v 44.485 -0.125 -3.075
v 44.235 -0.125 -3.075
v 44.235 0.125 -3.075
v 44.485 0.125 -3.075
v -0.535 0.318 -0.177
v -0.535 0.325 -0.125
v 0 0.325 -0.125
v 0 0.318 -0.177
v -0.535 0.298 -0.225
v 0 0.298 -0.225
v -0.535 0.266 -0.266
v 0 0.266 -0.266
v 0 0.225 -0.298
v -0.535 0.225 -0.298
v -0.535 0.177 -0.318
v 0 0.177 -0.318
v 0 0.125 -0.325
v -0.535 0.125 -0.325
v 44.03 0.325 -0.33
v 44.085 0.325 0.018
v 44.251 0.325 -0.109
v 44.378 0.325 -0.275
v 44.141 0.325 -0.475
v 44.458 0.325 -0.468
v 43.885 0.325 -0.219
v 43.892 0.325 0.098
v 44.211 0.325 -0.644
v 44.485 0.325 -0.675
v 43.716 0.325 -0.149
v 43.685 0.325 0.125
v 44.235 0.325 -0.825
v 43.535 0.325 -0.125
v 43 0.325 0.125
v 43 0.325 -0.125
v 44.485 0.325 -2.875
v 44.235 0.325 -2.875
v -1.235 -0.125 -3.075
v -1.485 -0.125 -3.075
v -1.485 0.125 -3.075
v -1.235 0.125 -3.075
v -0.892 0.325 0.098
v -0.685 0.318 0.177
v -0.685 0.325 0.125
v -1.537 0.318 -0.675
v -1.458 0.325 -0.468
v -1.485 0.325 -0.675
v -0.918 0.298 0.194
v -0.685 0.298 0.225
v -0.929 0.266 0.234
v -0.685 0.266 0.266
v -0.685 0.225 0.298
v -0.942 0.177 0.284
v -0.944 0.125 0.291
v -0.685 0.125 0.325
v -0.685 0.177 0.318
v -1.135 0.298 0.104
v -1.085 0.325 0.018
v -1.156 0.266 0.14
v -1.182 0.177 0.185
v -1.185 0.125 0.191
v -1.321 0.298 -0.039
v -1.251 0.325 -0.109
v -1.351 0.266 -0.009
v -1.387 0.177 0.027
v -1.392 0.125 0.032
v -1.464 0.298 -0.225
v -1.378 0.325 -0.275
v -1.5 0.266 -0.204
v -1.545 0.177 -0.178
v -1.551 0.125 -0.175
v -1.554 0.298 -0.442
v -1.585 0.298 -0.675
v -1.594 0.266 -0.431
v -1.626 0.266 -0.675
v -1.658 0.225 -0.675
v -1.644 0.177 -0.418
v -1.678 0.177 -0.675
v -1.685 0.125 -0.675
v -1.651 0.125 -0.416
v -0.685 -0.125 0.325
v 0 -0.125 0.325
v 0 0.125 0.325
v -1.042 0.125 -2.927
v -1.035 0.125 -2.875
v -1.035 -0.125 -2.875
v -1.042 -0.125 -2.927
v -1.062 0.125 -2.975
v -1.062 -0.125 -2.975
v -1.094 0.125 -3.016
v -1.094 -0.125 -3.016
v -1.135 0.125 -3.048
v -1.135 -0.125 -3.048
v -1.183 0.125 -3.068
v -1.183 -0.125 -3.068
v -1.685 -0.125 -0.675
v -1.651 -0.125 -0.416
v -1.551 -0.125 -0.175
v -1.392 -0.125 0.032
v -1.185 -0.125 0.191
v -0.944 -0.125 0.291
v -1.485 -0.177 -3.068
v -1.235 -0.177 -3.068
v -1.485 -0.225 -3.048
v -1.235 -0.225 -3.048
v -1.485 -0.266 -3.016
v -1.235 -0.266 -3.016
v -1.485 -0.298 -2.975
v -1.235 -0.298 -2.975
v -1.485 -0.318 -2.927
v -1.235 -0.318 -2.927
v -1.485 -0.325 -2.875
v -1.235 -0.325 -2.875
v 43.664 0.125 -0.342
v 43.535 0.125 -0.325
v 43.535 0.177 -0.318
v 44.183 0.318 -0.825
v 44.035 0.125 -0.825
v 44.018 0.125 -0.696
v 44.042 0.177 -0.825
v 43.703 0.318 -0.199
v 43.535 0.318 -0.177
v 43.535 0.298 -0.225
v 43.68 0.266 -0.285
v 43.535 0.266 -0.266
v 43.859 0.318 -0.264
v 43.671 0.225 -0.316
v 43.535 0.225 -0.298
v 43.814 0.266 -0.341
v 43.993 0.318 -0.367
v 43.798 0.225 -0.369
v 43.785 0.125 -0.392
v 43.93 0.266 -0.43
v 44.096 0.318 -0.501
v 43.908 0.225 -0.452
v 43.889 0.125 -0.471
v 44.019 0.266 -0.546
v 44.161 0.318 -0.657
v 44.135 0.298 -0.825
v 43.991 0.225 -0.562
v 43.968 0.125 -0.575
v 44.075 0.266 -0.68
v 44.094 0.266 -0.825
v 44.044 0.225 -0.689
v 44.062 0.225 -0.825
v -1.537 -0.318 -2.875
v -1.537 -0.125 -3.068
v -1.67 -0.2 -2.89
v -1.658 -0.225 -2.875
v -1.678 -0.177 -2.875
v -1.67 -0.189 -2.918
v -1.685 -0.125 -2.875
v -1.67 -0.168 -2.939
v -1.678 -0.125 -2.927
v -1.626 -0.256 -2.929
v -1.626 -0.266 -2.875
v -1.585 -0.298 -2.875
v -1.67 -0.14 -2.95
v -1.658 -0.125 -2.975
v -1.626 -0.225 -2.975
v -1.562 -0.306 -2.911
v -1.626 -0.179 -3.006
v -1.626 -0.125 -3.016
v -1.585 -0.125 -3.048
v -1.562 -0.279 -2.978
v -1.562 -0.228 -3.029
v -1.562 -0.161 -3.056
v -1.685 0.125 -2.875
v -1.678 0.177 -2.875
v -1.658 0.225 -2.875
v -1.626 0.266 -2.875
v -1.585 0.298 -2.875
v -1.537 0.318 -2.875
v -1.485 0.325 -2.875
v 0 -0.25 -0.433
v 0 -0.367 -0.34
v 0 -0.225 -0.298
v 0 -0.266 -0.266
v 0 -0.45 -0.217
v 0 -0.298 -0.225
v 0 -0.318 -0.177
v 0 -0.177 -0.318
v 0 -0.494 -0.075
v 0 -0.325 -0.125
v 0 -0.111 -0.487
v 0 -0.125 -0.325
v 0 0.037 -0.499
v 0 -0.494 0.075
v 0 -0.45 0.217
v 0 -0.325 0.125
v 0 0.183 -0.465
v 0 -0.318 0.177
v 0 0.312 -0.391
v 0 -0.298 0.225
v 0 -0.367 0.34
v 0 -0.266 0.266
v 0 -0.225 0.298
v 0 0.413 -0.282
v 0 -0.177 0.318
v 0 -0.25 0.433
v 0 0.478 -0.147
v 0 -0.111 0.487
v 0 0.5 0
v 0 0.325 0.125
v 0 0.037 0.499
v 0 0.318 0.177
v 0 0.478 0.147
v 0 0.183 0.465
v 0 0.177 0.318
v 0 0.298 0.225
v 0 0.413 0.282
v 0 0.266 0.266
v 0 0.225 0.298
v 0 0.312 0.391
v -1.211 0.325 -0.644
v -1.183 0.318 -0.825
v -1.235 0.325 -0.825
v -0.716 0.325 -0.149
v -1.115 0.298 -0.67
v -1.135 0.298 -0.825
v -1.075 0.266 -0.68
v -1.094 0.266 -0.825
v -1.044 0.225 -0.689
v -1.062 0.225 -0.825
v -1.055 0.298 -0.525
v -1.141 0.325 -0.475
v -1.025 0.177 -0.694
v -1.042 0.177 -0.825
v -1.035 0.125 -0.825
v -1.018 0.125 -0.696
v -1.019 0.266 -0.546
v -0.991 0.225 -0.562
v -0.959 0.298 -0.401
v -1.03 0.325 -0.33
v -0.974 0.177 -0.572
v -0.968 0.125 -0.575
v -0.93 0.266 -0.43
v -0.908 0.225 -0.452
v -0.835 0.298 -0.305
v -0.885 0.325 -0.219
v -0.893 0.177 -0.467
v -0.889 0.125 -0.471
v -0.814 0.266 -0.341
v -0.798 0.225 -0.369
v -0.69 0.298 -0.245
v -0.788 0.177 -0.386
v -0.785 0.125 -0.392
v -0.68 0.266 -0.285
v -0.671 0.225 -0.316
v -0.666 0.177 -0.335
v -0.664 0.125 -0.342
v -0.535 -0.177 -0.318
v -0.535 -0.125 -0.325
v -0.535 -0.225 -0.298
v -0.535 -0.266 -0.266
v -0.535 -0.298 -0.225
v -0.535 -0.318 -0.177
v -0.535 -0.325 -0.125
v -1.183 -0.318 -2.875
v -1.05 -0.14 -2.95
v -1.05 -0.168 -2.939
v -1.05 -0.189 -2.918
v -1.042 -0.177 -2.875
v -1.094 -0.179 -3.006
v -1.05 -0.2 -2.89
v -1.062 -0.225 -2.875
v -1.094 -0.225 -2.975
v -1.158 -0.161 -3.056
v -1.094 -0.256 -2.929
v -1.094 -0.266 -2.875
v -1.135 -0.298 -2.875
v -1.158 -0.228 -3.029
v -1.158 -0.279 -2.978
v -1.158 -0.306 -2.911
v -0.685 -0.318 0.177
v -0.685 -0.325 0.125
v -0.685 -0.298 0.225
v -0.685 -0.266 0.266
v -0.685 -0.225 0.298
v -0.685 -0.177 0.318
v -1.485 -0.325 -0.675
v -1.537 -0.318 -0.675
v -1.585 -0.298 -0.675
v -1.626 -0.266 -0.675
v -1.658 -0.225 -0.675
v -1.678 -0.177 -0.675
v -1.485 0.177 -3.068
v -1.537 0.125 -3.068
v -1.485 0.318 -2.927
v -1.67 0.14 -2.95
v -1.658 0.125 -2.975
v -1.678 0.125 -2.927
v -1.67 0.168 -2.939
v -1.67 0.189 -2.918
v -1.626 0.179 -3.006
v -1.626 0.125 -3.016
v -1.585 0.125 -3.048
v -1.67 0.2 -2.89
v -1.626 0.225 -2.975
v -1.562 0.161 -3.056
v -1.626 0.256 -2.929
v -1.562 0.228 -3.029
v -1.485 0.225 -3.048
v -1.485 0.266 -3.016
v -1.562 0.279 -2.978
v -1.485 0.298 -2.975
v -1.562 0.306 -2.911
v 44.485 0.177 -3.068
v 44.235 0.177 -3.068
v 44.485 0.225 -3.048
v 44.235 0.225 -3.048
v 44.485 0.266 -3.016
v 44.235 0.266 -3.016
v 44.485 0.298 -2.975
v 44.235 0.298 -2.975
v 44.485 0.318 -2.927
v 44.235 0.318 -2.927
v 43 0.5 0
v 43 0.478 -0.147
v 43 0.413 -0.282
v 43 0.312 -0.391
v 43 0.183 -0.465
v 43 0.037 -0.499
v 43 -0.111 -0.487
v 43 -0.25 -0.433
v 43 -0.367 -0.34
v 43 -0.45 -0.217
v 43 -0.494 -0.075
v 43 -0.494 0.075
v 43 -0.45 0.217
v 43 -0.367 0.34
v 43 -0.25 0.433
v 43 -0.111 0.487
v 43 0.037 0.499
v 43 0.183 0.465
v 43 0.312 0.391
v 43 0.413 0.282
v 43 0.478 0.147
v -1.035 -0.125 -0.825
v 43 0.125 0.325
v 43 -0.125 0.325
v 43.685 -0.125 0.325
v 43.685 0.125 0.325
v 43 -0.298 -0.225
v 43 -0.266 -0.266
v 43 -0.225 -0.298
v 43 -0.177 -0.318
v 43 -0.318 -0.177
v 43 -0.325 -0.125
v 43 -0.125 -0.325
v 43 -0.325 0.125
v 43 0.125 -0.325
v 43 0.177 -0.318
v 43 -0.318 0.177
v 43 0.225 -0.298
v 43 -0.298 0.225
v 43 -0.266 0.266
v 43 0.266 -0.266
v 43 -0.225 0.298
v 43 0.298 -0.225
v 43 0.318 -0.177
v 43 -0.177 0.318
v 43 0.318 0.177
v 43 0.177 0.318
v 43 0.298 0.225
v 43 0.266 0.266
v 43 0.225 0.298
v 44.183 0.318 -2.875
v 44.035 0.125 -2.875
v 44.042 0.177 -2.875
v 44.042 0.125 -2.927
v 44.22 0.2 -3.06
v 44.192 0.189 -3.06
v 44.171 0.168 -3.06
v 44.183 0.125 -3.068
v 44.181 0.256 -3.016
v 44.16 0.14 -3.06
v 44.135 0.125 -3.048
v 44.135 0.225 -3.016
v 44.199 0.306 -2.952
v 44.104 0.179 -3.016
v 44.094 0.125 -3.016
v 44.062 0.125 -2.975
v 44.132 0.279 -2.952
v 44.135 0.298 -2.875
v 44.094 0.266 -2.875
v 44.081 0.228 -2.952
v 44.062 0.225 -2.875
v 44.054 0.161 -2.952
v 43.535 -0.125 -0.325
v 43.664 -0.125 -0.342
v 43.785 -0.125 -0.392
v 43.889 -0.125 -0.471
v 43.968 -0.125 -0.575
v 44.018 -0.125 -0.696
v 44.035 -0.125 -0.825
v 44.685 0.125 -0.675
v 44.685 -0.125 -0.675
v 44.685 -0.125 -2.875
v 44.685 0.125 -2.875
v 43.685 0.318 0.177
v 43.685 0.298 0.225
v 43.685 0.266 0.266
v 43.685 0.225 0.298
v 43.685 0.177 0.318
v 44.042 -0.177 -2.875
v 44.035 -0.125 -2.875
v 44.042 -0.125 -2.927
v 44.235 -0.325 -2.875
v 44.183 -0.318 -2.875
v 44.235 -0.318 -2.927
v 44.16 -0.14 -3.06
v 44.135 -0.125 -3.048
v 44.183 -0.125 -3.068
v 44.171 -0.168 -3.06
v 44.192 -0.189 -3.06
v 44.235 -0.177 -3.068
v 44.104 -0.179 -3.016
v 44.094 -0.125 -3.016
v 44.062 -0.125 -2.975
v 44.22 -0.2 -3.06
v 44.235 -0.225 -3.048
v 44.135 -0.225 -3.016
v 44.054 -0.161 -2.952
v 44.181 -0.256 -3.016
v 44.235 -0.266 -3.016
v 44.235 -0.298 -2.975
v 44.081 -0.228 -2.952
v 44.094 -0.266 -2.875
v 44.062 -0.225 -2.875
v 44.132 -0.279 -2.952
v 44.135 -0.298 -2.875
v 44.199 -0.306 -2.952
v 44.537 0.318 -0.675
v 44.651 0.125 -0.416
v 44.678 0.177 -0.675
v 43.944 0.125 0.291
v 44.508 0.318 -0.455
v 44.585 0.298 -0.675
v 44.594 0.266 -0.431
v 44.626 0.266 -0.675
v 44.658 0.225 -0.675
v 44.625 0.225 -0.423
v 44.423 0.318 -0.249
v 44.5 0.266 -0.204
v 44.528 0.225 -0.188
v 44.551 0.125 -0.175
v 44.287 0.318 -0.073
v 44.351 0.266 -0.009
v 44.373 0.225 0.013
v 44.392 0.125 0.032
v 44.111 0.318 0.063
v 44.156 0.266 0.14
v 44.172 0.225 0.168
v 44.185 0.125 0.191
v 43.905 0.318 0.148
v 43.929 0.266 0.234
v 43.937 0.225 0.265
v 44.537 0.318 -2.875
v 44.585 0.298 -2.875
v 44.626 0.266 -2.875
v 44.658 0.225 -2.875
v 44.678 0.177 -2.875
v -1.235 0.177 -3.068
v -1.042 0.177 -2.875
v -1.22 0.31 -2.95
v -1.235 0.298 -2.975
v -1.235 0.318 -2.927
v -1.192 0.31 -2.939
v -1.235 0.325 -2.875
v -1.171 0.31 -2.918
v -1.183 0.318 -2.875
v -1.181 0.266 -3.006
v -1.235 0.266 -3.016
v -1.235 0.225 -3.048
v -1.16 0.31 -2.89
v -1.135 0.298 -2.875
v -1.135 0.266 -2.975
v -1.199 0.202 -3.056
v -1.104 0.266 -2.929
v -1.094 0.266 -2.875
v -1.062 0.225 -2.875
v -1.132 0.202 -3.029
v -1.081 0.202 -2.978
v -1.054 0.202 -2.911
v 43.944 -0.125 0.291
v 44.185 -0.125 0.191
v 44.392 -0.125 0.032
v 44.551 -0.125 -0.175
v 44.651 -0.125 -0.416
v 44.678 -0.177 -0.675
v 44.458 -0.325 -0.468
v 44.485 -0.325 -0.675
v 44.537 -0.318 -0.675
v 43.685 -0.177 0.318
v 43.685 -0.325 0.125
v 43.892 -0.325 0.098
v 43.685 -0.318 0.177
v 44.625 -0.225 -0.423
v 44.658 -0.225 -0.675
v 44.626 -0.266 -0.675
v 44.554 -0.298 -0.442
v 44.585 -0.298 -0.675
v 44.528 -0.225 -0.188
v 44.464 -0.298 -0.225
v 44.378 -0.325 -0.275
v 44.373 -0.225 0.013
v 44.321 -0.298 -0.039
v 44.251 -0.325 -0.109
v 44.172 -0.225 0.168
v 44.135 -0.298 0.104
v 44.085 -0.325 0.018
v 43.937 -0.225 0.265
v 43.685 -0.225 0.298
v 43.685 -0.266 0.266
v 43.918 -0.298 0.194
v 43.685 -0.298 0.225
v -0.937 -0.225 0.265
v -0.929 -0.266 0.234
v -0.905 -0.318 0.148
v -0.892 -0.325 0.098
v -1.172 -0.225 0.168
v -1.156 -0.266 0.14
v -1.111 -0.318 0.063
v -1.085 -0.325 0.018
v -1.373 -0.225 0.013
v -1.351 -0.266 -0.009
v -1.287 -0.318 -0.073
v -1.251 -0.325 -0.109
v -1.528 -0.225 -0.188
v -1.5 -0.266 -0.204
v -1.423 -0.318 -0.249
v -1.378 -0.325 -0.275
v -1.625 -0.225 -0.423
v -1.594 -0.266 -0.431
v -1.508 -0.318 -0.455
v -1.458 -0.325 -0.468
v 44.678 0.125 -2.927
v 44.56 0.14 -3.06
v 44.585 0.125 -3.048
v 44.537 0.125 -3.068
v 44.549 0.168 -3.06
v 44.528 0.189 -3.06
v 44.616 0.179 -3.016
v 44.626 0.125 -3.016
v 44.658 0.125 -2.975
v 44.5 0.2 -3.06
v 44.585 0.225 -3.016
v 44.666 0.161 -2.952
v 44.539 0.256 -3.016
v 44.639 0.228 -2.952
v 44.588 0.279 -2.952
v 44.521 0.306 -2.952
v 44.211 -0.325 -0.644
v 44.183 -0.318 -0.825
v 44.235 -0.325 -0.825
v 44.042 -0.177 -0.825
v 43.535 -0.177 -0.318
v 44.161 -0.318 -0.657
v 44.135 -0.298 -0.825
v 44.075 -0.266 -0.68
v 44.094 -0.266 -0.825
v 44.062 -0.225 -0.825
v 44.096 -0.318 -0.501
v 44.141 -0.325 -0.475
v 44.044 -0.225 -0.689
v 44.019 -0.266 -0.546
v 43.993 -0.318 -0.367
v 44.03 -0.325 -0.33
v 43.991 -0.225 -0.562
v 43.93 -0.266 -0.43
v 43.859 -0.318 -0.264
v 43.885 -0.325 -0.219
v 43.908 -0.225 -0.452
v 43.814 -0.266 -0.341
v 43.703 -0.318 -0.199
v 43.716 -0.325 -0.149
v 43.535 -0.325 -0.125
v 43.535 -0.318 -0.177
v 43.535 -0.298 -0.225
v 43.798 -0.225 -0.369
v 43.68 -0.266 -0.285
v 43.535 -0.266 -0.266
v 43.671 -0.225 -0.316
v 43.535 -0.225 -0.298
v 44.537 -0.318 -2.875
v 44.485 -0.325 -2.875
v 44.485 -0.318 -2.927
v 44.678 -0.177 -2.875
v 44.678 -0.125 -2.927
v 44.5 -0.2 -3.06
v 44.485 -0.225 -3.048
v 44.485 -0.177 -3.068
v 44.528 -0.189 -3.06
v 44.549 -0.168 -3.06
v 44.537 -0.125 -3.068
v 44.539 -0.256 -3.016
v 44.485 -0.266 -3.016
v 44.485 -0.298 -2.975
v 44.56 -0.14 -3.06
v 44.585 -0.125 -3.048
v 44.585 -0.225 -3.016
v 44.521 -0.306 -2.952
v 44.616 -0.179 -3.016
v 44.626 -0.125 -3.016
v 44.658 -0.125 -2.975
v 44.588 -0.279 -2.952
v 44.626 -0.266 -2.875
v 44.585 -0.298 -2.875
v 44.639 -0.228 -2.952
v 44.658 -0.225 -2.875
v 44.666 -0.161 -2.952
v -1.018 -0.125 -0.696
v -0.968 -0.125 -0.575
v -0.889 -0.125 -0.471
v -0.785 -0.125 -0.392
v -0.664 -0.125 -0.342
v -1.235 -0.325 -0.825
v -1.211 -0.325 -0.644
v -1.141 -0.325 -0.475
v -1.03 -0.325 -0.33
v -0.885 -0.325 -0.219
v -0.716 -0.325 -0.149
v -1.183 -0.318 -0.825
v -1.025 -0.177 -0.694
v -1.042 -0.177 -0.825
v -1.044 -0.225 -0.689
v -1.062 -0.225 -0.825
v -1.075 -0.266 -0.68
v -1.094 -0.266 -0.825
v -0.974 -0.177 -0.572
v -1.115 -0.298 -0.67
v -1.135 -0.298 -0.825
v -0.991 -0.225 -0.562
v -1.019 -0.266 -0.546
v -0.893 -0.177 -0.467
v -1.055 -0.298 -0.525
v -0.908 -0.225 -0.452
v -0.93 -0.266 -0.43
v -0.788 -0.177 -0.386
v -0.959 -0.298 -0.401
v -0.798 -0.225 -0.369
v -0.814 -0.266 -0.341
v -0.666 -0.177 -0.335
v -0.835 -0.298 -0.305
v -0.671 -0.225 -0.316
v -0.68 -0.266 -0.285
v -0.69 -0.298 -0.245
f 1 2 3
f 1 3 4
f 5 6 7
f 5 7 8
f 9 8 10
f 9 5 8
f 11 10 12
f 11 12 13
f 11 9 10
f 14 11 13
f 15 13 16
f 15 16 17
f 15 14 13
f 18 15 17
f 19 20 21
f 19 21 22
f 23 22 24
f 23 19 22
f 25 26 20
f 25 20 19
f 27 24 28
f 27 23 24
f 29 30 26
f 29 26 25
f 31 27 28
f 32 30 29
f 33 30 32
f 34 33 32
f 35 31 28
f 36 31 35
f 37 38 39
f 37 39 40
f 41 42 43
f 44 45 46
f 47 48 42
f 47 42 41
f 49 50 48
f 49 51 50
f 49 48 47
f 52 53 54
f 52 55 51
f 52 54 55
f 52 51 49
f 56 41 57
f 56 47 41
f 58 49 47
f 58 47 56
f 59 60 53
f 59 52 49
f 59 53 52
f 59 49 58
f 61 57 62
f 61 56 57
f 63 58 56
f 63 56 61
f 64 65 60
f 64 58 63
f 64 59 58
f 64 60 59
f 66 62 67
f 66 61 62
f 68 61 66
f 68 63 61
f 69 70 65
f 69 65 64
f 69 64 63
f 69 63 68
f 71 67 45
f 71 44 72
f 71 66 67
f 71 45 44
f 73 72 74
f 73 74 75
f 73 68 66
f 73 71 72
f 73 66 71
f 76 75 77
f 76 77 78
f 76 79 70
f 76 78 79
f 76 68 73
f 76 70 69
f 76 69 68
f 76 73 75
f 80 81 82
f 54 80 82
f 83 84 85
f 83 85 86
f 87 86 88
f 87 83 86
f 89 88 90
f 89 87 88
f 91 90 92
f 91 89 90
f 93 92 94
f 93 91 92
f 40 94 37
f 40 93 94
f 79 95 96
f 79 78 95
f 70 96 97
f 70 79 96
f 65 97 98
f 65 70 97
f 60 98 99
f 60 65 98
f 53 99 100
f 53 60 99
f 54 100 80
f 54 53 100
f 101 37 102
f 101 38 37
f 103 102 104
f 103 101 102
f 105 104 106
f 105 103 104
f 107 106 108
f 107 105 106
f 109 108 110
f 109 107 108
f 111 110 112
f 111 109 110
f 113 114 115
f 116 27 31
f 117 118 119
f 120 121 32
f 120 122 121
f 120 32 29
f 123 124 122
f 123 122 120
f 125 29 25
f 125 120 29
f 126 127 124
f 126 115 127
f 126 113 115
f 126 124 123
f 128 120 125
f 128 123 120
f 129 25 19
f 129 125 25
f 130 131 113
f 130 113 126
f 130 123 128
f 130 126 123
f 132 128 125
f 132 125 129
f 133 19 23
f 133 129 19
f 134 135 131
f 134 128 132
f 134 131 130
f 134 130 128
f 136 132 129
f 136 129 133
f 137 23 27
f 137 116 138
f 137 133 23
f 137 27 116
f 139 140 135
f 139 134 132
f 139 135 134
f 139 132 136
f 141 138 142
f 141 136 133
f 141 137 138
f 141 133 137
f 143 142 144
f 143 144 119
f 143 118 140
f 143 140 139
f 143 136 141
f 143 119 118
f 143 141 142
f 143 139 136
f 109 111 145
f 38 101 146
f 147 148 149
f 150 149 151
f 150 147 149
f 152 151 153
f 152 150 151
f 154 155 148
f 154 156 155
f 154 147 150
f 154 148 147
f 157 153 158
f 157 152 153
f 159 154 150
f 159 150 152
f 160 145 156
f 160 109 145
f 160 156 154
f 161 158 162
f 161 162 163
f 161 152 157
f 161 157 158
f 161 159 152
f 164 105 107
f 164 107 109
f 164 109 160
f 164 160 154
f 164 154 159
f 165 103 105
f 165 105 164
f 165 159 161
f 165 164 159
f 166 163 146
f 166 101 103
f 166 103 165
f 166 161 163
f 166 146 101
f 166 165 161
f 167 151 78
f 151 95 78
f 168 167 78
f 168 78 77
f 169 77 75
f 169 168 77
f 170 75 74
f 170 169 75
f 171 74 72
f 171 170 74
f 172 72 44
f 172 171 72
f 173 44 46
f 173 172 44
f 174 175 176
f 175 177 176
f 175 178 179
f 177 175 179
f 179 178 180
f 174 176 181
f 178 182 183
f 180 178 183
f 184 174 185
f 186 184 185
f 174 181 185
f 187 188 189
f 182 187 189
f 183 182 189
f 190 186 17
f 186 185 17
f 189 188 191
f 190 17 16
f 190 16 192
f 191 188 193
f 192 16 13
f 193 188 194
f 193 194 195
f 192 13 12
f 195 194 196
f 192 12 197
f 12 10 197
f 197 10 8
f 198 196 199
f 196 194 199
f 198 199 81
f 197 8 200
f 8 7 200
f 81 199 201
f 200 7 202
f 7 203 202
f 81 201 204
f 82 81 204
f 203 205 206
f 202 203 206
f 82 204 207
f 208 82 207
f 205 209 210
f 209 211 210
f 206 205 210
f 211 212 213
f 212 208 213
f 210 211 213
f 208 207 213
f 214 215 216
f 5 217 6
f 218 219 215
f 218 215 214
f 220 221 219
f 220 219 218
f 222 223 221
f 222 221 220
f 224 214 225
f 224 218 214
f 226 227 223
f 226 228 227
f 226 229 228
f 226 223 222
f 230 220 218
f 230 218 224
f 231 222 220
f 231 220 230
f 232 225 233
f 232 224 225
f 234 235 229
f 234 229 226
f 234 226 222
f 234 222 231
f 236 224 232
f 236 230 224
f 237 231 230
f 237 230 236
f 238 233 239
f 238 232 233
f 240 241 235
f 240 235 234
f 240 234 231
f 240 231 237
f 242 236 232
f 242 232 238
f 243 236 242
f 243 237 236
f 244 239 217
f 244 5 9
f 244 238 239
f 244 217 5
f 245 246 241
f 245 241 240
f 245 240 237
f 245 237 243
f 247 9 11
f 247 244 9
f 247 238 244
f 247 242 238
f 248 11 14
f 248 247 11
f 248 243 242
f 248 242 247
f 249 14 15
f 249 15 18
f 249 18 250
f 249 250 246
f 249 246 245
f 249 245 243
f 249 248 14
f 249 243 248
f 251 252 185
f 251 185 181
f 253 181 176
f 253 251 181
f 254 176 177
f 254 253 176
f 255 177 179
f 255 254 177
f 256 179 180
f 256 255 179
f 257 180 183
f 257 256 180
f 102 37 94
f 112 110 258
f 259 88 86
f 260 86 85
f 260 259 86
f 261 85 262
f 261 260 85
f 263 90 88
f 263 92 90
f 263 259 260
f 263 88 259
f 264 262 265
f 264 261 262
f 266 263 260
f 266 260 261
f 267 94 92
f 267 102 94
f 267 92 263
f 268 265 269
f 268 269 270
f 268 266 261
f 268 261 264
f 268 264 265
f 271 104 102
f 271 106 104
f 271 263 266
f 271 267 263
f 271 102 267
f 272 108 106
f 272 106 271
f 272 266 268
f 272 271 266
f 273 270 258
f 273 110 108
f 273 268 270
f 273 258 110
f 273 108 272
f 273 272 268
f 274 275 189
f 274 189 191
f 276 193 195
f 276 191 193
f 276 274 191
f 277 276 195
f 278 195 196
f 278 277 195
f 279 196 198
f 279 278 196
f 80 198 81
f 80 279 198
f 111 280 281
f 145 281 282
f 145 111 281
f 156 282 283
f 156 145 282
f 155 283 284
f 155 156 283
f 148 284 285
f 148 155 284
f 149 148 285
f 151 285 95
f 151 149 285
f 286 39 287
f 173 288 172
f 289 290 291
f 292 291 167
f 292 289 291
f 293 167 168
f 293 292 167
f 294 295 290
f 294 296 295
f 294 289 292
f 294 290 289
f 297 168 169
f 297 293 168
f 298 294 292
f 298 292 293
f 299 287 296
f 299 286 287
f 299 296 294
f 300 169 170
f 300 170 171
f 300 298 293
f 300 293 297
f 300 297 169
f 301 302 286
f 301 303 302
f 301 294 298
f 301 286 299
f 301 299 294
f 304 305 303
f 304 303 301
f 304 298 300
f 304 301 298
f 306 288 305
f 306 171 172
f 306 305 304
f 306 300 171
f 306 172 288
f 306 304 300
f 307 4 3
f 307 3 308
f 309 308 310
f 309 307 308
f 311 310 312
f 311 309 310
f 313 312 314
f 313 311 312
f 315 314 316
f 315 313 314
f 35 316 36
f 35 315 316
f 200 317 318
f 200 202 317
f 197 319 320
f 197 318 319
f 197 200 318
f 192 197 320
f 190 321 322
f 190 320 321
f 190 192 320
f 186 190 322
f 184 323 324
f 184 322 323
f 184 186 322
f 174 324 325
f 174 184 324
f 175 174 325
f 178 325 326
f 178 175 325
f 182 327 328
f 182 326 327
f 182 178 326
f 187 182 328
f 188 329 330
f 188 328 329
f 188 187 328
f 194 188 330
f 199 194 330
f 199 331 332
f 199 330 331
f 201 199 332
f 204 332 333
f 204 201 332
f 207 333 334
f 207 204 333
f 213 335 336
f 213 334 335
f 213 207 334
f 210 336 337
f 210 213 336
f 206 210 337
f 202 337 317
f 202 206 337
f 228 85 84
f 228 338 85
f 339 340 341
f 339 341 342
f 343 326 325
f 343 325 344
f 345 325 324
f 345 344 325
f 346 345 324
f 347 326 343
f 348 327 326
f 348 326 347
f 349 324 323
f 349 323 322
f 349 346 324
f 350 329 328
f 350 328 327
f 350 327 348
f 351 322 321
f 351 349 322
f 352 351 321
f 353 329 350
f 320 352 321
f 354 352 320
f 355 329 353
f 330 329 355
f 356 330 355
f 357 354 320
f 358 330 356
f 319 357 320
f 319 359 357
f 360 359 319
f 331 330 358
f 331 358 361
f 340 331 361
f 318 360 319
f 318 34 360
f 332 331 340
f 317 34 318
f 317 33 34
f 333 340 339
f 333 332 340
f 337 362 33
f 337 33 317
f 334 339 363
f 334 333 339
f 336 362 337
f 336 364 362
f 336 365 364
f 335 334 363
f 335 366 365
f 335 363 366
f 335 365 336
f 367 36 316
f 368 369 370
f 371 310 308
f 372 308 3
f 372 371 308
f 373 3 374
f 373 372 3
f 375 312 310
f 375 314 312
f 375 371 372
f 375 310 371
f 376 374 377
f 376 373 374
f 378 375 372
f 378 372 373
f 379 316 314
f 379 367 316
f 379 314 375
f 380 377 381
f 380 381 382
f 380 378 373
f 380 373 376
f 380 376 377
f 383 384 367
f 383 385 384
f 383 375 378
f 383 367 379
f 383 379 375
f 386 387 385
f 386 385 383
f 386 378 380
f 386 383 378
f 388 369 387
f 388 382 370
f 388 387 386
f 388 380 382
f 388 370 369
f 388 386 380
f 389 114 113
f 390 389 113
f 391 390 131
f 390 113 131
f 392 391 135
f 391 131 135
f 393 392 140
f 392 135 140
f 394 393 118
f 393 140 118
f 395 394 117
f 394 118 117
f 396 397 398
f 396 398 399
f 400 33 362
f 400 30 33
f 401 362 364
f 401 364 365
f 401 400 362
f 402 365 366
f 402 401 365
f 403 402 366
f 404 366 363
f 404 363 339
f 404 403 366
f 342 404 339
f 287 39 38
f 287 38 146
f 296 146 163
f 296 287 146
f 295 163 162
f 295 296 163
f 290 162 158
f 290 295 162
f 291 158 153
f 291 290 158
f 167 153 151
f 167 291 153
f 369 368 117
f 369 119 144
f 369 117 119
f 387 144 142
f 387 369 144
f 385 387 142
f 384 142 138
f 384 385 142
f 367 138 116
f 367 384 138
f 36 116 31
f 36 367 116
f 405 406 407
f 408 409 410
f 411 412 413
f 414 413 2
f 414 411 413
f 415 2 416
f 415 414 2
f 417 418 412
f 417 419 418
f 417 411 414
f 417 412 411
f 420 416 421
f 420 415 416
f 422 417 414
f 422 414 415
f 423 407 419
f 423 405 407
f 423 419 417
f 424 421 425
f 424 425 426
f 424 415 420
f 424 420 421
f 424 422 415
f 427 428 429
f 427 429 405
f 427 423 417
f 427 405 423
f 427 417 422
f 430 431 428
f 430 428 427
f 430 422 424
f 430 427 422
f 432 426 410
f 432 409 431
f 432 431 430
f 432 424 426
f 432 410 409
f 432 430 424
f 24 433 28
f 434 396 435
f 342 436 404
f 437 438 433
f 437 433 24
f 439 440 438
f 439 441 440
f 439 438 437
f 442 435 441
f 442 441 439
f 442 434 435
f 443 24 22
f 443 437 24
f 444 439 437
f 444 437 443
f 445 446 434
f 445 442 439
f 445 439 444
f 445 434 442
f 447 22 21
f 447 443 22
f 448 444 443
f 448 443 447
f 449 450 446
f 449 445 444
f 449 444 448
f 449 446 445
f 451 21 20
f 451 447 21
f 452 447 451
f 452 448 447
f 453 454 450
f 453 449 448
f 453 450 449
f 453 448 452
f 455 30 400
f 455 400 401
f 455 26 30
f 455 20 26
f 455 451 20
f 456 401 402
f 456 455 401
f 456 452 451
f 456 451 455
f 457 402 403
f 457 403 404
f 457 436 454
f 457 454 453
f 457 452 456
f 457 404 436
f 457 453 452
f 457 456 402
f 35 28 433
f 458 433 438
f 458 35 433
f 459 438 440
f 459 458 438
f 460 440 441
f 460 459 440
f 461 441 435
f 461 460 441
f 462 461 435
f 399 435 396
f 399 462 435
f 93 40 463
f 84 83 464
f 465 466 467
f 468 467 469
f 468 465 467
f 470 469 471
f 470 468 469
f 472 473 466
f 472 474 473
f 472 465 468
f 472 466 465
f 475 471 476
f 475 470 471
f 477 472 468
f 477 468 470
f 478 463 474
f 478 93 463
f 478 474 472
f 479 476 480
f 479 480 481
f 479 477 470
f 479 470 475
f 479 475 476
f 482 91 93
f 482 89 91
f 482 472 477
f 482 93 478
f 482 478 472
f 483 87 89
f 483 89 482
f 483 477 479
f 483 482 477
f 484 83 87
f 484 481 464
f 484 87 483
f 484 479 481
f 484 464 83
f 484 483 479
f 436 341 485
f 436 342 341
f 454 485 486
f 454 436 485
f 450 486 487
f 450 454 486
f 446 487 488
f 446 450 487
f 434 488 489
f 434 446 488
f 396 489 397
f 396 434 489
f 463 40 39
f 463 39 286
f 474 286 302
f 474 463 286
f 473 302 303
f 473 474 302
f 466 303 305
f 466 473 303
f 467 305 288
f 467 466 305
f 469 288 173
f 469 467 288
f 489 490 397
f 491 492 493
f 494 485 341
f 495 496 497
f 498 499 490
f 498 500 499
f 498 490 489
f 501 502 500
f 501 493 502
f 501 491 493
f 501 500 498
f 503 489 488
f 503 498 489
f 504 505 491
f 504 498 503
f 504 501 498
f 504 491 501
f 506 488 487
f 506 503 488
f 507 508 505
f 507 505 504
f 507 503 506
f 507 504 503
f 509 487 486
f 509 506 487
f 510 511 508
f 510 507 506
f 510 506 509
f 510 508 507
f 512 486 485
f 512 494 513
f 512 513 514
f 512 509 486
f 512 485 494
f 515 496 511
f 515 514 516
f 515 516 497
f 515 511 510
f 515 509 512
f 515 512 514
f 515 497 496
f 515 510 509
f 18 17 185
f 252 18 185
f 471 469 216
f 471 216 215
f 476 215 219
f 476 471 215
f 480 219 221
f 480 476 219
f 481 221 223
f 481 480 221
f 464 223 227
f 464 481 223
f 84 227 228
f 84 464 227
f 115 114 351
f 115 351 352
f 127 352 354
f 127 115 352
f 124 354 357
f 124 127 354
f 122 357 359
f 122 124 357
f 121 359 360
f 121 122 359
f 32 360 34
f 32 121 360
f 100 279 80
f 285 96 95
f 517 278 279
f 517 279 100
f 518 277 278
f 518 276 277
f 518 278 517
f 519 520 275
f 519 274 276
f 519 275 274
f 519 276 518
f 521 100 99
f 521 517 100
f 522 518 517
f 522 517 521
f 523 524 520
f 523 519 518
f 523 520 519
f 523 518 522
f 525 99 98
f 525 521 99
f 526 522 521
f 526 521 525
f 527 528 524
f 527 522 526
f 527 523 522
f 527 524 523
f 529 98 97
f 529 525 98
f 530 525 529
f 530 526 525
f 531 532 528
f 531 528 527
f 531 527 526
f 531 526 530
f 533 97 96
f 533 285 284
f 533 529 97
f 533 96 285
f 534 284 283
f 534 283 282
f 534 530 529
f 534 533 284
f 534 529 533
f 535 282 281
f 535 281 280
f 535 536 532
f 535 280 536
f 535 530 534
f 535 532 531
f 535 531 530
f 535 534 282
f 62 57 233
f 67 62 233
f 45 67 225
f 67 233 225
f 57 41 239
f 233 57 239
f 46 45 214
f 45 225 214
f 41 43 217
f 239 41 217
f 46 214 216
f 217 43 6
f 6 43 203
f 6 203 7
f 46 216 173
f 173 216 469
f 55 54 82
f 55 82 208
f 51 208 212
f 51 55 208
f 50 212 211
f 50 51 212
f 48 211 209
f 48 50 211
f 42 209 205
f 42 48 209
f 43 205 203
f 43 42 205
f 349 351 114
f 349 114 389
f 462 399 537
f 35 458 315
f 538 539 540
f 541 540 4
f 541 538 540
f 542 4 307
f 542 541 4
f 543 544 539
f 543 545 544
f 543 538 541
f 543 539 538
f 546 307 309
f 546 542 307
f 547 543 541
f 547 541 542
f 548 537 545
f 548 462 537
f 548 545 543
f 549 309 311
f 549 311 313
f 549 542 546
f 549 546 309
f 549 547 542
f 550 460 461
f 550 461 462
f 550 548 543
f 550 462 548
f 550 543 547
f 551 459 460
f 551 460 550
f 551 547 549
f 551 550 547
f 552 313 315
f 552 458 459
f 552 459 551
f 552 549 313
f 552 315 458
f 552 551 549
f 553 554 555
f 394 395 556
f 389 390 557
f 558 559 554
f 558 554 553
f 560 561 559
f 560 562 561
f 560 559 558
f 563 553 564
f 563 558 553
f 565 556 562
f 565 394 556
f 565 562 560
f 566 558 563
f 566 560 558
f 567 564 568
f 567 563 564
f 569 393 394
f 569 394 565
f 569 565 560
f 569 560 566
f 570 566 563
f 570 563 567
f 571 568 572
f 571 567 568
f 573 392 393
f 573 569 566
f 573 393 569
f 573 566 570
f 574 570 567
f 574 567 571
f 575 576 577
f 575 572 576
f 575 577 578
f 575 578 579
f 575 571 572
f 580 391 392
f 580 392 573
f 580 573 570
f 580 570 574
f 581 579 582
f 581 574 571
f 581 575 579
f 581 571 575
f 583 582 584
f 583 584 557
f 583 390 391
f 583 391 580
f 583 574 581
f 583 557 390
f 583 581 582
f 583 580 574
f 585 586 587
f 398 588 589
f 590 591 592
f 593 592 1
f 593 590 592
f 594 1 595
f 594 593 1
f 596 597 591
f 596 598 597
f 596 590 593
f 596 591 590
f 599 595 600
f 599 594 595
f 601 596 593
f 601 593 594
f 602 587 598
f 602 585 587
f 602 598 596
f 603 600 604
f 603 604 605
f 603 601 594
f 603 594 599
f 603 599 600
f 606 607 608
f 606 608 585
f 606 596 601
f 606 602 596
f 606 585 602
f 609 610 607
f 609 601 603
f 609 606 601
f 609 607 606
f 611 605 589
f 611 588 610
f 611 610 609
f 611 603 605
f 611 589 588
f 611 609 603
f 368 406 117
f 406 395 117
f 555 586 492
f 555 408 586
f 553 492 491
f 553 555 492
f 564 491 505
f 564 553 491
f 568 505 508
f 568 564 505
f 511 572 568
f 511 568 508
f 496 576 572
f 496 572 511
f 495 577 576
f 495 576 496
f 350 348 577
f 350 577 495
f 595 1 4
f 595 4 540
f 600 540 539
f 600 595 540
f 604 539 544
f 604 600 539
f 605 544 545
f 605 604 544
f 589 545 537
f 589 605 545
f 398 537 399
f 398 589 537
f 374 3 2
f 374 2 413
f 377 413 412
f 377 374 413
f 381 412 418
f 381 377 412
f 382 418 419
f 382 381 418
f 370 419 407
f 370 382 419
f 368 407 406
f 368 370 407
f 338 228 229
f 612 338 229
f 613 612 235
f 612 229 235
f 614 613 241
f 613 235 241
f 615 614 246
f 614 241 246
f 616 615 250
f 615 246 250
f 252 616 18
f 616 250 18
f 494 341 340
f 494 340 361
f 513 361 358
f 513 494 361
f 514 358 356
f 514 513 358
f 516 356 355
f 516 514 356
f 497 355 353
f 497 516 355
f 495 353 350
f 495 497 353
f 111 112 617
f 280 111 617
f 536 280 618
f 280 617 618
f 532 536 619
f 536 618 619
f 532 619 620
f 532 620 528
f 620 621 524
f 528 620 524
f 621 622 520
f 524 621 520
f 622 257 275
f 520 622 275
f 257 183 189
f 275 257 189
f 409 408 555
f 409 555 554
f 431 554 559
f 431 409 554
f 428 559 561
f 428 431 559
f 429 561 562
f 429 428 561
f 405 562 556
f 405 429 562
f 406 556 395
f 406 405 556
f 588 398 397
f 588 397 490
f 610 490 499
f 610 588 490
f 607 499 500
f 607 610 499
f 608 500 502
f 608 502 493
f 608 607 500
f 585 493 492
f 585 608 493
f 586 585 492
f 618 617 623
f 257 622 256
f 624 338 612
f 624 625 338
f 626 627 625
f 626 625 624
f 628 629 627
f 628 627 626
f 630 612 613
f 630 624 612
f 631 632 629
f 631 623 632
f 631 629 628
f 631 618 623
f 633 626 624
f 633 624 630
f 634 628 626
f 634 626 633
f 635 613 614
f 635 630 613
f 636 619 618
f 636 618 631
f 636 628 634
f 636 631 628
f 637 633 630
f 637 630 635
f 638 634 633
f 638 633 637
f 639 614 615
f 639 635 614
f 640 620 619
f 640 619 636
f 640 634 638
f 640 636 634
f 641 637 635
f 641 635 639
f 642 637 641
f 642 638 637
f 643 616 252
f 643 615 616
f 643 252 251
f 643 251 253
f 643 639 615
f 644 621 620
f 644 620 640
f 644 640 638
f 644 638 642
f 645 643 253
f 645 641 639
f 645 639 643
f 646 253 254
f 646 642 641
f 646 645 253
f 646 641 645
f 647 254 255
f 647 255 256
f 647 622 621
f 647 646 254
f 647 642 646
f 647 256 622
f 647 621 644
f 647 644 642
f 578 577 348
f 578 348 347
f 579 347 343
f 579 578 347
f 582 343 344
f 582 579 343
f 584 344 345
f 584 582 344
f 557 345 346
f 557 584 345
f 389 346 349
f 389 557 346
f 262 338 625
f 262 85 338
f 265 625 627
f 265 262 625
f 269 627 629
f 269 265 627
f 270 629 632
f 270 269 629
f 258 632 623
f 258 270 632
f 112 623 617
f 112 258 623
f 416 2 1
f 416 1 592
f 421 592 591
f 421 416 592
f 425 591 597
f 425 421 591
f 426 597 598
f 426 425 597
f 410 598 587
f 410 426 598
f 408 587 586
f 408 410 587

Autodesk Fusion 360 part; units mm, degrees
sketch "Sketch1" plane through (0, 0, 0) normal (1, 0, 0) x (0, 1, 0)
  circle A0 centre (0, 0) radius 0.5
  line L0 (0.325, -0.325) -> (-0.325, -0.325)
  line L1 (-0.325, -0.325) -> (-0.325, 0.325)
  line L2 (-0.325, 0.325) -> (0.325, 0.325)
  line L3 (0.325, 0.325) -> (0.325, -0.325)
  line L4 (0.325, -0.325) -> (-0.325, 0.325) construction
  line L5 (-0.325, -0.325) -> (0.325, 0.325) construction
  dimension "d1" = 1
  dimension "d2" = 0.65
  dimension "d3" = 0.65
extrude "Extrude1" add sketch "Sketch1" along normal blind 43 contours A0 | L0 L1 L2 L3
sketch "Sketch2" plane through (43, 0, 0) normal (1, 0, 0) x (0, 1, 0)
  circle A0 centre (0, 0) radius 0.5
  line L0 (0.325, -0.325) -> (-0.325, -0.325)
  line L1 (-0.325, -0.325) -> (-0.325, 0.325)
  line L2 (-0.325, 0.325) -> (0.325, 0.325)
  line L3 (0.325, 0.325) -> (0.325, -0.325)
  line L4 (0.325, -0.325) -> (-0.325, 0.325) construction
  line L5 (-0.325, -0.325) -> (0.325, 0.325) construction
  dimension "d8" = 0.65
  dimension "d9" = 0.65
extrude "Extrude2" add sketch "Sketch2" along normal blind 1.685 contours L0 L1 L2 L3
extrude "Extrude3" add sketch "Sketch1" against normal blind 1.685 contours L0 L1 L2 L3
sketch "Sketch3" plane through (0, 0, -0.325) normal (0, 0, -1) x (1, 0, 0)
  line L0 (43, 0.325) -> (43, -0.325)
  line L1 (43, -0.325) -> (44.685, -0.325)
  line L2 (44.685, -0.325) -> (44.685, 0.325)
  line L3 (44.685, 0.325) -> (43, 0.325)
  line L4 (44.685, 0.325) -> (44.035, 0.325)
  line L5 (44.035, 0.325) -> (44.035, -0.325)
  line L6 (44.035, -0.325) -> (44.685, -0.325)
  line L7 (44.685, -0.325) -> (44.685, 0.325)
  line L8 (44.685, 0.325) -> (44.035, -0.325) construction
  line L9 (44.035, 0.325) -> (44.685, -0.325) construction
  point P0 (44.36, 0)
  dimension "d14" = 0.65
  dimension "d15" = 0.65
sketch "Sketch4" plane through (0, 0, -0.325) normal (0, 0, -1) x (1, 0, 0)
  line L0 (0, -0.325) -> (0, 0.325)
  line L1 (0, 0.325) -> (-1.685, 0.325)
  line L2 (-1.685, 0.325) -> (-1.685, -0.325)
  line L3 (-1.685, -0.325) -> (0, -0.325)
  line L4 (-1.035, -0.325) -> (-1.685, -0.325)
  line L5 (-1.685, -0.325) -> (-1.685, 0.325)
  line L6 (-1.685, 0.325) -> (-1.035, 0.325)
  line L7 (-1.035, 0.325) -> (-1.035, -0.325)
  line L8 (-1.035, -0.325) -> (-1.685, 0.325) construction
  line L9 (-1.685, -0.325) -> (-1.035, 0.325) construction
  point P0 (-1.36, 0)
  dimension "d17" = 0.65
  dimension "d18" = 0.65
extrude "Extrude4" add sketch "Sketch4" sketch "Sketch3" along normal blind 2.75 contours L1 L2 L3 L4 L5 L6 L7 of sketch 2 contours L1 L2 L3 L4 L5 L6 L7
fillet "Fillet1" radius 0.5 2 edges at (-1.035, 0, -0.325) (44.035, 0, -0.325)
fillet "Fillet2" radius 1 2 edges at (-1.685, 0, 0.325) (44.685, 0, 0.325)
fillet "Fillet3" radius 0.2 32 edges at (-1.36, -0.325, -3.075) (-1.035, 0, -3.075) (-1.36, 0.325, -3.075) (-1.685, 0, -3.075) (-0.8886, -0.325, -0.4714) (-1.035, -0.325, -1.95) (-0.2675, -0.325, -0.325) (-0.3425, -0.325, 0.325) (-1.3921, -0.325, 0.0321) (-1.685, -0.325, -1.875) (-0.3425, 0.325, 0.325) (-1.3921, 0.325, 0.0321) (-1.685, 0.325, -1.875) (-0.8886, 0.325, -0.4714) (-0.2675, 0.325, -0.325) (-1.035, 0.325, -1.95) (43.3425, -0.325, 0.325) (44.3921, -0.325, 0.0321) (44.685, -0.325, -1.875) (44.035, -0.325, -1.95) (43.8886, -0.325, -0.4714) (43.2675, -0.325, -0.325) (44.685, 0.325, -1.875) (44.3921, 0.325, 0.0321) (43.3425, 0.325, 0.325) (43.8886, 0.325, -0.4714) (44.035, 0.325, -1.95) (43.2675, 0.325, -0.325) (44.36, 0.325, -3.075) (44.685, 0, -3.075) (44.36, -0.325, -3.075) (44.035, 0, -3.075)
equation "d1 = width"
equation "d2 = d3"
equation "d3 = d1 * 0.65"
equation "width = 1 mm"
equation "baseLenght = 43 mm"
equation "d6 = baseLenght"
equation "d8 = width * 0.65"
equation "d9 = d8"
equation "d10 = ( ( 2.54 * ceil(( baseLenght + 1.3 * width ) / 2.54 mm) ) * 1 mm + 0.65 * width - baseLenght ) / 2"
equation "d12 = -( ( 2.54 * ceil(( baseLenght + 1.3 * width ) / 2.54 mm) ) * 1 mm + 0.65 * width - baseLenght ) / 2"
equation "d14 = width * 0.65"
equation "d15 = d14"
equation "d17 = width * 0.65"
equation "d18 = d17"
equation "d26 = 0.2 * width"
